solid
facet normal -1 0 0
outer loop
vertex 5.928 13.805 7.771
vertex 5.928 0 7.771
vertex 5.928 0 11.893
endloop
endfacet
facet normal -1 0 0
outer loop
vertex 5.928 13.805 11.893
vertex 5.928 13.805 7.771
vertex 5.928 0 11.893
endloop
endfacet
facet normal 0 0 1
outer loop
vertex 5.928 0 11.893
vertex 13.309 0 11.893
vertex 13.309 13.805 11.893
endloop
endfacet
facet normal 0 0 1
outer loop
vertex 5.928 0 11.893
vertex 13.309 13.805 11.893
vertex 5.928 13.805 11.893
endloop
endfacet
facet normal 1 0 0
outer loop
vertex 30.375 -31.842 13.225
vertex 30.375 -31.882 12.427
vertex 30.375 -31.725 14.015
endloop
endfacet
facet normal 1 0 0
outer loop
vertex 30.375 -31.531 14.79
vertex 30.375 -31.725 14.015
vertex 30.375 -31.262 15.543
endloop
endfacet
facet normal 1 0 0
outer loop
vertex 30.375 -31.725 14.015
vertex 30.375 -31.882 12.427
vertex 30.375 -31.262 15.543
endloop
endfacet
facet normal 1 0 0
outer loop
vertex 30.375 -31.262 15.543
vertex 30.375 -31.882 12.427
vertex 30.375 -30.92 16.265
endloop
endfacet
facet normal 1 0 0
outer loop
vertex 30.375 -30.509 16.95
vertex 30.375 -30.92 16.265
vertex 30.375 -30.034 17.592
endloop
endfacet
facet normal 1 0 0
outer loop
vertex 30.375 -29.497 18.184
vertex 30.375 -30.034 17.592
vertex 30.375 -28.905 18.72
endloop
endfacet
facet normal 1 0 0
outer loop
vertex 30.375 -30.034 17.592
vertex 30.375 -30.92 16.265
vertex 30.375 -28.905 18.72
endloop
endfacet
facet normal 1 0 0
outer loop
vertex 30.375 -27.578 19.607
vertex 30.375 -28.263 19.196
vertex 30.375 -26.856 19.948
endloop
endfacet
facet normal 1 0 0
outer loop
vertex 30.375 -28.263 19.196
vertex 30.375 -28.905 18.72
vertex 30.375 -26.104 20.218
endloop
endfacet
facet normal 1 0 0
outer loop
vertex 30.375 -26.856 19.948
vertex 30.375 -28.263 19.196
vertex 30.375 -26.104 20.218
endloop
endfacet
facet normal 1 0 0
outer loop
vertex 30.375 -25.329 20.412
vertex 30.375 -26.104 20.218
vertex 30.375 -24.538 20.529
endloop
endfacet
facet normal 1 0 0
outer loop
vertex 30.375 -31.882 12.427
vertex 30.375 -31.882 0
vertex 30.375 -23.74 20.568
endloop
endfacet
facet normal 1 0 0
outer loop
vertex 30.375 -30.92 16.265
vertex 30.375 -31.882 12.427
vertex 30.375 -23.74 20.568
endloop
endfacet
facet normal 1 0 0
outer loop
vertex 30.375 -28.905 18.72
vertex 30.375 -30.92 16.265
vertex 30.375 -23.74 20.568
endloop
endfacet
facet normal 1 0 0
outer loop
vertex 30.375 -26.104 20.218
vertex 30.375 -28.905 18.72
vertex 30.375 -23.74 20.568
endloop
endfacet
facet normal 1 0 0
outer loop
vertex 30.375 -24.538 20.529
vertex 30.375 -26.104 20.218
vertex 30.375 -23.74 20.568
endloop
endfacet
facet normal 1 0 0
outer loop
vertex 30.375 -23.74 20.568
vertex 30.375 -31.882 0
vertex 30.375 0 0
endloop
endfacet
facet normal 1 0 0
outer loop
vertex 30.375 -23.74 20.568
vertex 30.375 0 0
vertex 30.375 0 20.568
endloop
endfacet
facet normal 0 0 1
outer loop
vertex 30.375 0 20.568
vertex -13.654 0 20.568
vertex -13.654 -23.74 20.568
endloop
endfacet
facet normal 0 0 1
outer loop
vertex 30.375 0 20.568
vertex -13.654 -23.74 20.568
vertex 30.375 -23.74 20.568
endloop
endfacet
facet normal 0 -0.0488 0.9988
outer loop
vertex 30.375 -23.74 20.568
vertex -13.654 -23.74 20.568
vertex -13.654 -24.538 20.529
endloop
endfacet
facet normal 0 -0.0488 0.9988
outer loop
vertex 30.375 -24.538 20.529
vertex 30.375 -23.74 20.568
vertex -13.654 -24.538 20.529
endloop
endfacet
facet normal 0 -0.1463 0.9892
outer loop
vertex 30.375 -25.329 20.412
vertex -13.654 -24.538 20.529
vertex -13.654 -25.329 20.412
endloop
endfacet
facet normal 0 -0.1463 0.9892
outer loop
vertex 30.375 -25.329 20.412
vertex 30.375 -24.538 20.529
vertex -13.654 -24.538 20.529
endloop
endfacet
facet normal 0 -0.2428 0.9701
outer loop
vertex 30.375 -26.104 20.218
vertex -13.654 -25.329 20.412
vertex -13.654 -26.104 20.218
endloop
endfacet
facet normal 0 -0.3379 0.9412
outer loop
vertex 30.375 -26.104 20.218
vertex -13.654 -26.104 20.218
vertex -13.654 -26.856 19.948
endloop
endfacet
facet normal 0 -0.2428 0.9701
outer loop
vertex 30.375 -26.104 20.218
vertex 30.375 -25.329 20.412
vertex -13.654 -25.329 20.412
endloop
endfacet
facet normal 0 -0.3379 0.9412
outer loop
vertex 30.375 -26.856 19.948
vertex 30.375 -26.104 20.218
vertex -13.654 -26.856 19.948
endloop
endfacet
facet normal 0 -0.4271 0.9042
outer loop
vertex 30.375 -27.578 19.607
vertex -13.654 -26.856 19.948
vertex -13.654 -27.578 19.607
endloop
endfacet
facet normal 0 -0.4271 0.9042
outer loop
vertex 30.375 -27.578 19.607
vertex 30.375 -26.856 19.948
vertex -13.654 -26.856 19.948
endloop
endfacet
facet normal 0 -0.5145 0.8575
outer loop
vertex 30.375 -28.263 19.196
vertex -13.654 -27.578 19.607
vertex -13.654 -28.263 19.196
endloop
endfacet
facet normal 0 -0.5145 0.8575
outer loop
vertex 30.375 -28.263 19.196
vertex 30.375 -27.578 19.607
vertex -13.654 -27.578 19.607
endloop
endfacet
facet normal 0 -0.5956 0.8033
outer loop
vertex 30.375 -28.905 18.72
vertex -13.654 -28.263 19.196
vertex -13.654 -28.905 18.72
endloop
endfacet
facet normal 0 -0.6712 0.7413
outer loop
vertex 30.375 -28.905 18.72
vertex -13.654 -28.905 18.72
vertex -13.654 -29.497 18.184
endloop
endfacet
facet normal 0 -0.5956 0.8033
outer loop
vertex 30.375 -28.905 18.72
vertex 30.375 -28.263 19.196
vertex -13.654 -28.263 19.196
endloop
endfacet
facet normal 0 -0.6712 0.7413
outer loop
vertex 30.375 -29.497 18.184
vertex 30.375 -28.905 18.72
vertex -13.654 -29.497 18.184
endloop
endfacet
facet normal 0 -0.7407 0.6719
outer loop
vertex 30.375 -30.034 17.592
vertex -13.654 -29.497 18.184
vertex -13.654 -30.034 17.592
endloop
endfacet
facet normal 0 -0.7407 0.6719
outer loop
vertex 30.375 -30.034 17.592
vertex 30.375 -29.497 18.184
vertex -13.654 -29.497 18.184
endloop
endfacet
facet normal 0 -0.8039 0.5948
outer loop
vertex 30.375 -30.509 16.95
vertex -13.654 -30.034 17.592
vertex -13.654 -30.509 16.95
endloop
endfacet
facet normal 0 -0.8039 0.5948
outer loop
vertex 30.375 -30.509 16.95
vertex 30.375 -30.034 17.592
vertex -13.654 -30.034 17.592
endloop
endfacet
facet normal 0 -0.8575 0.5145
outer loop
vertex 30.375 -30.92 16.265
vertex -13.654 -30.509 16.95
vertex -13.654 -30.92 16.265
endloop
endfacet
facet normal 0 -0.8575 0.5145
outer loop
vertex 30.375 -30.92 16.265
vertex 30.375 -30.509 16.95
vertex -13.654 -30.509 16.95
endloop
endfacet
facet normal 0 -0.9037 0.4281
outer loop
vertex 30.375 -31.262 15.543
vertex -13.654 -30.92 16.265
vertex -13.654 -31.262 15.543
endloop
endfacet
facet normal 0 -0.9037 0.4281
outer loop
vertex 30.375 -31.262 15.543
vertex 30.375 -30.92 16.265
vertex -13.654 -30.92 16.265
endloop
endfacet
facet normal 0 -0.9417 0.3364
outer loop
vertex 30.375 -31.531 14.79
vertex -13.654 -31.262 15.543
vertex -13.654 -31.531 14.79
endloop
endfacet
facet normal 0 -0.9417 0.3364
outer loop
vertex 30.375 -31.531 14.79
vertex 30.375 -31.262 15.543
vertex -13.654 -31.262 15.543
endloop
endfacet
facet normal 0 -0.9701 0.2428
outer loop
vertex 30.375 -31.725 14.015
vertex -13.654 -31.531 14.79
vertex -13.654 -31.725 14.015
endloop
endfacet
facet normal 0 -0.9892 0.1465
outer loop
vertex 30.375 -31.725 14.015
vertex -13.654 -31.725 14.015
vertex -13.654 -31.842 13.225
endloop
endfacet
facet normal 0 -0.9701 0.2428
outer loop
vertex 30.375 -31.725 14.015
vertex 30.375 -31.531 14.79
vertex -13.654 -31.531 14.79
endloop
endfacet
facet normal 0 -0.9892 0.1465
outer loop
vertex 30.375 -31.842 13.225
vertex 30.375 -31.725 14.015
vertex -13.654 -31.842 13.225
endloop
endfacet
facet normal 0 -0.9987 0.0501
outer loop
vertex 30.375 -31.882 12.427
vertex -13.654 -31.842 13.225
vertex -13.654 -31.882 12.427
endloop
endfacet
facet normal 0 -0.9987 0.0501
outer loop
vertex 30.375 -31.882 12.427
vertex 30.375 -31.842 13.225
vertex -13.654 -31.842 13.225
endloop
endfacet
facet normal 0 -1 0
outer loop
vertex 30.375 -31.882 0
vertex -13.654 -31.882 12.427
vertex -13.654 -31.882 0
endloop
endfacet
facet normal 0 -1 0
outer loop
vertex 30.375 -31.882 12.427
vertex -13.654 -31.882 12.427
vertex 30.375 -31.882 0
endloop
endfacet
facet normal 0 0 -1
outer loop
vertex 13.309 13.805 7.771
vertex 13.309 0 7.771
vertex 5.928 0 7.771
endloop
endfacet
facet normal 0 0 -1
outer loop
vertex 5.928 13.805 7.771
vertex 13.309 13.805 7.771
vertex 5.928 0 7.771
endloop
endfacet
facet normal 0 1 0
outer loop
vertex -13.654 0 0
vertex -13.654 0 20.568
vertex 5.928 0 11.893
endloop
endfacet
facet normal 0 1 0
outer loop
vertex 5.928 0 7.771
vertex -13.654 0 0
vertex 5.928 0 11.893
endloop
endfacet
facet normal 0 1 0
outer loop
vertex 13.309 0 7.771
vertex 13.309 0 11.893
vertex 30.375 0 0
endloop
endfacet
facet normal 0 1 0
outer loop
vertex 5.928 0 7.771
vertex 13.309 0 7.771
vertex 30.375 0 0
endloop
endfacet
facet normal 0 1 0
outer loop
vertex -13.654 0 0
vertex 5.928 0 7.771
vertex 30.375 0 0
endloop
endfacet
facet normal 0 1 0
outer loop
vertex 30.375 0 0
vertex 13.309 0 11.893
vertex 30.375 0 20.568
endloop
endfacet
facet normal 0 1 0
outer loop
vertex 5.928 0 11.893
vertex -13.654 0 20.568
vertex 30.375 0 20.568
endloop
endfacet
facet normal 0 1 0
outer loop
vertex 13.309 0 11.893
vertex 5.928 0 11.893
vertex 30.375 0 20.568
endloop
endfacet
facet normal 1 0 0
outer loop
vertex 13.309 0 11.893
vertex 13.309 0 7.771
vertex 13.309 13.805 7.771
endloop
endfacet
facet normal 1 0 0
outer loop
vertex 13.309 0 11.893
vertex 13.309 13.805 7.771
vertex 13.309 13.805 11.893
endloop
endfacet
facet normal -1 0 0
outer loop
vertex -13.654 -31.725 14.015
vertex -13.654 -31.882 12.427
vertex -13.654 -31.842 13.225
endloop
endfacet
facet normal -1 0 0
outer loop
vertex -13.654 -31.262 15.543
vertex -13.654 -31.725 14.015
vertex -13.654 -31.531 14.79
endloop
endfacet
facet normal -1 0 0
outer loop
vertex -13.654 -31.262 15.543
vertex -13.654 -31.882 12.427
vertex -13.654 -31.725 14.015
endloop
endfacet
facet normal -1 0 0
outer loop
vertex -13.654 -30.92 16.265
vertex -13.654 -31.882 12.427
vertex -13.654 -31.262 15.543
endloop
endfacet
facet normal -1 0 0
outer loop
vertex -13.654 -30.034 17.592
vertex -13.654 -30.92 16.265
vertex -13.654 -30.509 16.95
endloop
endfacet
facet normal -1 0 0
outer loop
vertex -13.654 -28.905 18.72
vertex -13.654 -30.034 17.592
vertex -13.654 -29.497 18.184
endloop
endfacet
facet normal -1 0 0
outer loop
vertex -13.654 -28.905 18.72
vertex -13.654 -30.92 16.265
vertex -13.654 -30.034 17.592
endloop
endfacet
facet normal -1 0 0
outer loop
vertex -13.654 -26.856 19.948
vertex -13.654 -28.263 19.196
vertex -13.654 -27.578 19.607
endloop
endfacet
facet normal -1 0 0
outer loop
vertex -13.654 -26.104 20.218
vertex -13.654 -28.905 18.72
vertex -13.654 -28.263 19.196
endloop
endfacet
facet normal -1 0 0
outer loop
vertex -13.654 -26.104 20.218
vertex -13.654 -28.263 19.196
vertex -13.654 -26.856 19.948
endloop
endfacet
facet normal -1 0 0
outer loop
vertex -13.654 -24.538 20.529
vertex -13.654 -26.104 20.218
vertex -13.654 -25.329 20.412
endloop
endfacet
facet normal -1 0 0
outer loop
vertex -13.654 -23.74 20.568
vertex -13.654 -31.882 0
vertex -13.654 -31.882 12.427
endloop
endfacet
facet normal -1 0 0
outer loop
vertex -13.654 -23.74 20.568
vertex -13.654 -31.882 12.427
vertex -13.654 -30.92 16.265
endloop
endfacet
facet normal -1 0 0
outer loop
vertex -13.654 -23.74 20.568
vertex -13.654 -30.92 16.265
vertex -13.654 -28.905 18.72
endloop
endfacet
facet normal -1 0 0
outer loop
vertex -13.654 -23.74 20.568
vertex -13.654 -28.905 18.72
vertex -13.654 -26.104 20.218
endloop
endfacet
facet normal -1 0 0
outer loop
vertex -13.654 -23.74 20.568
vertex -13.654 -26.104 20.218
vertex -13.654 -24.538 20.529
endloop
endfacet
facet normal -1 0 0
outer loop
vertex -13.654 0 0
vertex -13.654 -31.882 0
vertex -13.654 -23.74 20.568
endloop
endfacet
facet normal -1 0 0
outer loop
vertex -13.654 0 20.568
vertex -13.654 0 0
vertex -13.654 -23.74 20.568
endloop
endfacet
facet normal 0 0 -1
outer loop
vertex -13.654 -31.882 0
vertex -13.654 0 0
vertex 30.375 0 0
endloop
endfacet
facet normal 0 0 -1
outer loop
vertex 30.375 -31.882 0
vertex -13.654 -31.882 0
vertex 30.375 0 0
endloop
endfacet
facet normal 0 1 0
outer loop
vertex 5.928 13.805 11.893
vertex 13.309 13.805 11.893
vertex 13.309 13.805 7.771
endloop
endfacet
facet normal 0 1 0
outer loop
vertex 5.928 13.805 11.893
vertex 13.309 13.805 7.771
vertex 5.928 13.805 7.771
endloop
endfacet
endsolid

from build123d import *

# Parameters (mm, degrees)
F0_W     = 44.029299
F0_H     = 20.568207
F1_DEPTH = 31.881519
F2_R     = 8.141147
F3_W     = 7.381364
F3_H     = 4.12172
F4_DEPTH = 13.804998


with BuildPart() as f1:
    # F0 (on Front) → F1 (new body)
    with BuildSketch(Plane.XZ):
        with Locations((8.360238, 10.284103)):
            Rectangle(F0_W, F0_H)
    extrude(amount=F1_DEPTH)

    # F2
    f2_edges = [f1.edges().sort_by_distance(p)[0] for p in [
        (8.360239, -31.881519, 20.568207),
    ]]
    fillet(f2_edges, radius=F2_R)

    # F3 (on face) → F4 (join)
    with BuildSketch(Plane(origin=(0, 0, 0), x_dir=(-1, 0, 0), z_dir=(0, 1, 0))):
        with Locations((-9.618722, 9.832263)):
            Rectangle(F3_W, F3_H)
    extrude(amount=F4_DEPTH)


solid = f1.part
